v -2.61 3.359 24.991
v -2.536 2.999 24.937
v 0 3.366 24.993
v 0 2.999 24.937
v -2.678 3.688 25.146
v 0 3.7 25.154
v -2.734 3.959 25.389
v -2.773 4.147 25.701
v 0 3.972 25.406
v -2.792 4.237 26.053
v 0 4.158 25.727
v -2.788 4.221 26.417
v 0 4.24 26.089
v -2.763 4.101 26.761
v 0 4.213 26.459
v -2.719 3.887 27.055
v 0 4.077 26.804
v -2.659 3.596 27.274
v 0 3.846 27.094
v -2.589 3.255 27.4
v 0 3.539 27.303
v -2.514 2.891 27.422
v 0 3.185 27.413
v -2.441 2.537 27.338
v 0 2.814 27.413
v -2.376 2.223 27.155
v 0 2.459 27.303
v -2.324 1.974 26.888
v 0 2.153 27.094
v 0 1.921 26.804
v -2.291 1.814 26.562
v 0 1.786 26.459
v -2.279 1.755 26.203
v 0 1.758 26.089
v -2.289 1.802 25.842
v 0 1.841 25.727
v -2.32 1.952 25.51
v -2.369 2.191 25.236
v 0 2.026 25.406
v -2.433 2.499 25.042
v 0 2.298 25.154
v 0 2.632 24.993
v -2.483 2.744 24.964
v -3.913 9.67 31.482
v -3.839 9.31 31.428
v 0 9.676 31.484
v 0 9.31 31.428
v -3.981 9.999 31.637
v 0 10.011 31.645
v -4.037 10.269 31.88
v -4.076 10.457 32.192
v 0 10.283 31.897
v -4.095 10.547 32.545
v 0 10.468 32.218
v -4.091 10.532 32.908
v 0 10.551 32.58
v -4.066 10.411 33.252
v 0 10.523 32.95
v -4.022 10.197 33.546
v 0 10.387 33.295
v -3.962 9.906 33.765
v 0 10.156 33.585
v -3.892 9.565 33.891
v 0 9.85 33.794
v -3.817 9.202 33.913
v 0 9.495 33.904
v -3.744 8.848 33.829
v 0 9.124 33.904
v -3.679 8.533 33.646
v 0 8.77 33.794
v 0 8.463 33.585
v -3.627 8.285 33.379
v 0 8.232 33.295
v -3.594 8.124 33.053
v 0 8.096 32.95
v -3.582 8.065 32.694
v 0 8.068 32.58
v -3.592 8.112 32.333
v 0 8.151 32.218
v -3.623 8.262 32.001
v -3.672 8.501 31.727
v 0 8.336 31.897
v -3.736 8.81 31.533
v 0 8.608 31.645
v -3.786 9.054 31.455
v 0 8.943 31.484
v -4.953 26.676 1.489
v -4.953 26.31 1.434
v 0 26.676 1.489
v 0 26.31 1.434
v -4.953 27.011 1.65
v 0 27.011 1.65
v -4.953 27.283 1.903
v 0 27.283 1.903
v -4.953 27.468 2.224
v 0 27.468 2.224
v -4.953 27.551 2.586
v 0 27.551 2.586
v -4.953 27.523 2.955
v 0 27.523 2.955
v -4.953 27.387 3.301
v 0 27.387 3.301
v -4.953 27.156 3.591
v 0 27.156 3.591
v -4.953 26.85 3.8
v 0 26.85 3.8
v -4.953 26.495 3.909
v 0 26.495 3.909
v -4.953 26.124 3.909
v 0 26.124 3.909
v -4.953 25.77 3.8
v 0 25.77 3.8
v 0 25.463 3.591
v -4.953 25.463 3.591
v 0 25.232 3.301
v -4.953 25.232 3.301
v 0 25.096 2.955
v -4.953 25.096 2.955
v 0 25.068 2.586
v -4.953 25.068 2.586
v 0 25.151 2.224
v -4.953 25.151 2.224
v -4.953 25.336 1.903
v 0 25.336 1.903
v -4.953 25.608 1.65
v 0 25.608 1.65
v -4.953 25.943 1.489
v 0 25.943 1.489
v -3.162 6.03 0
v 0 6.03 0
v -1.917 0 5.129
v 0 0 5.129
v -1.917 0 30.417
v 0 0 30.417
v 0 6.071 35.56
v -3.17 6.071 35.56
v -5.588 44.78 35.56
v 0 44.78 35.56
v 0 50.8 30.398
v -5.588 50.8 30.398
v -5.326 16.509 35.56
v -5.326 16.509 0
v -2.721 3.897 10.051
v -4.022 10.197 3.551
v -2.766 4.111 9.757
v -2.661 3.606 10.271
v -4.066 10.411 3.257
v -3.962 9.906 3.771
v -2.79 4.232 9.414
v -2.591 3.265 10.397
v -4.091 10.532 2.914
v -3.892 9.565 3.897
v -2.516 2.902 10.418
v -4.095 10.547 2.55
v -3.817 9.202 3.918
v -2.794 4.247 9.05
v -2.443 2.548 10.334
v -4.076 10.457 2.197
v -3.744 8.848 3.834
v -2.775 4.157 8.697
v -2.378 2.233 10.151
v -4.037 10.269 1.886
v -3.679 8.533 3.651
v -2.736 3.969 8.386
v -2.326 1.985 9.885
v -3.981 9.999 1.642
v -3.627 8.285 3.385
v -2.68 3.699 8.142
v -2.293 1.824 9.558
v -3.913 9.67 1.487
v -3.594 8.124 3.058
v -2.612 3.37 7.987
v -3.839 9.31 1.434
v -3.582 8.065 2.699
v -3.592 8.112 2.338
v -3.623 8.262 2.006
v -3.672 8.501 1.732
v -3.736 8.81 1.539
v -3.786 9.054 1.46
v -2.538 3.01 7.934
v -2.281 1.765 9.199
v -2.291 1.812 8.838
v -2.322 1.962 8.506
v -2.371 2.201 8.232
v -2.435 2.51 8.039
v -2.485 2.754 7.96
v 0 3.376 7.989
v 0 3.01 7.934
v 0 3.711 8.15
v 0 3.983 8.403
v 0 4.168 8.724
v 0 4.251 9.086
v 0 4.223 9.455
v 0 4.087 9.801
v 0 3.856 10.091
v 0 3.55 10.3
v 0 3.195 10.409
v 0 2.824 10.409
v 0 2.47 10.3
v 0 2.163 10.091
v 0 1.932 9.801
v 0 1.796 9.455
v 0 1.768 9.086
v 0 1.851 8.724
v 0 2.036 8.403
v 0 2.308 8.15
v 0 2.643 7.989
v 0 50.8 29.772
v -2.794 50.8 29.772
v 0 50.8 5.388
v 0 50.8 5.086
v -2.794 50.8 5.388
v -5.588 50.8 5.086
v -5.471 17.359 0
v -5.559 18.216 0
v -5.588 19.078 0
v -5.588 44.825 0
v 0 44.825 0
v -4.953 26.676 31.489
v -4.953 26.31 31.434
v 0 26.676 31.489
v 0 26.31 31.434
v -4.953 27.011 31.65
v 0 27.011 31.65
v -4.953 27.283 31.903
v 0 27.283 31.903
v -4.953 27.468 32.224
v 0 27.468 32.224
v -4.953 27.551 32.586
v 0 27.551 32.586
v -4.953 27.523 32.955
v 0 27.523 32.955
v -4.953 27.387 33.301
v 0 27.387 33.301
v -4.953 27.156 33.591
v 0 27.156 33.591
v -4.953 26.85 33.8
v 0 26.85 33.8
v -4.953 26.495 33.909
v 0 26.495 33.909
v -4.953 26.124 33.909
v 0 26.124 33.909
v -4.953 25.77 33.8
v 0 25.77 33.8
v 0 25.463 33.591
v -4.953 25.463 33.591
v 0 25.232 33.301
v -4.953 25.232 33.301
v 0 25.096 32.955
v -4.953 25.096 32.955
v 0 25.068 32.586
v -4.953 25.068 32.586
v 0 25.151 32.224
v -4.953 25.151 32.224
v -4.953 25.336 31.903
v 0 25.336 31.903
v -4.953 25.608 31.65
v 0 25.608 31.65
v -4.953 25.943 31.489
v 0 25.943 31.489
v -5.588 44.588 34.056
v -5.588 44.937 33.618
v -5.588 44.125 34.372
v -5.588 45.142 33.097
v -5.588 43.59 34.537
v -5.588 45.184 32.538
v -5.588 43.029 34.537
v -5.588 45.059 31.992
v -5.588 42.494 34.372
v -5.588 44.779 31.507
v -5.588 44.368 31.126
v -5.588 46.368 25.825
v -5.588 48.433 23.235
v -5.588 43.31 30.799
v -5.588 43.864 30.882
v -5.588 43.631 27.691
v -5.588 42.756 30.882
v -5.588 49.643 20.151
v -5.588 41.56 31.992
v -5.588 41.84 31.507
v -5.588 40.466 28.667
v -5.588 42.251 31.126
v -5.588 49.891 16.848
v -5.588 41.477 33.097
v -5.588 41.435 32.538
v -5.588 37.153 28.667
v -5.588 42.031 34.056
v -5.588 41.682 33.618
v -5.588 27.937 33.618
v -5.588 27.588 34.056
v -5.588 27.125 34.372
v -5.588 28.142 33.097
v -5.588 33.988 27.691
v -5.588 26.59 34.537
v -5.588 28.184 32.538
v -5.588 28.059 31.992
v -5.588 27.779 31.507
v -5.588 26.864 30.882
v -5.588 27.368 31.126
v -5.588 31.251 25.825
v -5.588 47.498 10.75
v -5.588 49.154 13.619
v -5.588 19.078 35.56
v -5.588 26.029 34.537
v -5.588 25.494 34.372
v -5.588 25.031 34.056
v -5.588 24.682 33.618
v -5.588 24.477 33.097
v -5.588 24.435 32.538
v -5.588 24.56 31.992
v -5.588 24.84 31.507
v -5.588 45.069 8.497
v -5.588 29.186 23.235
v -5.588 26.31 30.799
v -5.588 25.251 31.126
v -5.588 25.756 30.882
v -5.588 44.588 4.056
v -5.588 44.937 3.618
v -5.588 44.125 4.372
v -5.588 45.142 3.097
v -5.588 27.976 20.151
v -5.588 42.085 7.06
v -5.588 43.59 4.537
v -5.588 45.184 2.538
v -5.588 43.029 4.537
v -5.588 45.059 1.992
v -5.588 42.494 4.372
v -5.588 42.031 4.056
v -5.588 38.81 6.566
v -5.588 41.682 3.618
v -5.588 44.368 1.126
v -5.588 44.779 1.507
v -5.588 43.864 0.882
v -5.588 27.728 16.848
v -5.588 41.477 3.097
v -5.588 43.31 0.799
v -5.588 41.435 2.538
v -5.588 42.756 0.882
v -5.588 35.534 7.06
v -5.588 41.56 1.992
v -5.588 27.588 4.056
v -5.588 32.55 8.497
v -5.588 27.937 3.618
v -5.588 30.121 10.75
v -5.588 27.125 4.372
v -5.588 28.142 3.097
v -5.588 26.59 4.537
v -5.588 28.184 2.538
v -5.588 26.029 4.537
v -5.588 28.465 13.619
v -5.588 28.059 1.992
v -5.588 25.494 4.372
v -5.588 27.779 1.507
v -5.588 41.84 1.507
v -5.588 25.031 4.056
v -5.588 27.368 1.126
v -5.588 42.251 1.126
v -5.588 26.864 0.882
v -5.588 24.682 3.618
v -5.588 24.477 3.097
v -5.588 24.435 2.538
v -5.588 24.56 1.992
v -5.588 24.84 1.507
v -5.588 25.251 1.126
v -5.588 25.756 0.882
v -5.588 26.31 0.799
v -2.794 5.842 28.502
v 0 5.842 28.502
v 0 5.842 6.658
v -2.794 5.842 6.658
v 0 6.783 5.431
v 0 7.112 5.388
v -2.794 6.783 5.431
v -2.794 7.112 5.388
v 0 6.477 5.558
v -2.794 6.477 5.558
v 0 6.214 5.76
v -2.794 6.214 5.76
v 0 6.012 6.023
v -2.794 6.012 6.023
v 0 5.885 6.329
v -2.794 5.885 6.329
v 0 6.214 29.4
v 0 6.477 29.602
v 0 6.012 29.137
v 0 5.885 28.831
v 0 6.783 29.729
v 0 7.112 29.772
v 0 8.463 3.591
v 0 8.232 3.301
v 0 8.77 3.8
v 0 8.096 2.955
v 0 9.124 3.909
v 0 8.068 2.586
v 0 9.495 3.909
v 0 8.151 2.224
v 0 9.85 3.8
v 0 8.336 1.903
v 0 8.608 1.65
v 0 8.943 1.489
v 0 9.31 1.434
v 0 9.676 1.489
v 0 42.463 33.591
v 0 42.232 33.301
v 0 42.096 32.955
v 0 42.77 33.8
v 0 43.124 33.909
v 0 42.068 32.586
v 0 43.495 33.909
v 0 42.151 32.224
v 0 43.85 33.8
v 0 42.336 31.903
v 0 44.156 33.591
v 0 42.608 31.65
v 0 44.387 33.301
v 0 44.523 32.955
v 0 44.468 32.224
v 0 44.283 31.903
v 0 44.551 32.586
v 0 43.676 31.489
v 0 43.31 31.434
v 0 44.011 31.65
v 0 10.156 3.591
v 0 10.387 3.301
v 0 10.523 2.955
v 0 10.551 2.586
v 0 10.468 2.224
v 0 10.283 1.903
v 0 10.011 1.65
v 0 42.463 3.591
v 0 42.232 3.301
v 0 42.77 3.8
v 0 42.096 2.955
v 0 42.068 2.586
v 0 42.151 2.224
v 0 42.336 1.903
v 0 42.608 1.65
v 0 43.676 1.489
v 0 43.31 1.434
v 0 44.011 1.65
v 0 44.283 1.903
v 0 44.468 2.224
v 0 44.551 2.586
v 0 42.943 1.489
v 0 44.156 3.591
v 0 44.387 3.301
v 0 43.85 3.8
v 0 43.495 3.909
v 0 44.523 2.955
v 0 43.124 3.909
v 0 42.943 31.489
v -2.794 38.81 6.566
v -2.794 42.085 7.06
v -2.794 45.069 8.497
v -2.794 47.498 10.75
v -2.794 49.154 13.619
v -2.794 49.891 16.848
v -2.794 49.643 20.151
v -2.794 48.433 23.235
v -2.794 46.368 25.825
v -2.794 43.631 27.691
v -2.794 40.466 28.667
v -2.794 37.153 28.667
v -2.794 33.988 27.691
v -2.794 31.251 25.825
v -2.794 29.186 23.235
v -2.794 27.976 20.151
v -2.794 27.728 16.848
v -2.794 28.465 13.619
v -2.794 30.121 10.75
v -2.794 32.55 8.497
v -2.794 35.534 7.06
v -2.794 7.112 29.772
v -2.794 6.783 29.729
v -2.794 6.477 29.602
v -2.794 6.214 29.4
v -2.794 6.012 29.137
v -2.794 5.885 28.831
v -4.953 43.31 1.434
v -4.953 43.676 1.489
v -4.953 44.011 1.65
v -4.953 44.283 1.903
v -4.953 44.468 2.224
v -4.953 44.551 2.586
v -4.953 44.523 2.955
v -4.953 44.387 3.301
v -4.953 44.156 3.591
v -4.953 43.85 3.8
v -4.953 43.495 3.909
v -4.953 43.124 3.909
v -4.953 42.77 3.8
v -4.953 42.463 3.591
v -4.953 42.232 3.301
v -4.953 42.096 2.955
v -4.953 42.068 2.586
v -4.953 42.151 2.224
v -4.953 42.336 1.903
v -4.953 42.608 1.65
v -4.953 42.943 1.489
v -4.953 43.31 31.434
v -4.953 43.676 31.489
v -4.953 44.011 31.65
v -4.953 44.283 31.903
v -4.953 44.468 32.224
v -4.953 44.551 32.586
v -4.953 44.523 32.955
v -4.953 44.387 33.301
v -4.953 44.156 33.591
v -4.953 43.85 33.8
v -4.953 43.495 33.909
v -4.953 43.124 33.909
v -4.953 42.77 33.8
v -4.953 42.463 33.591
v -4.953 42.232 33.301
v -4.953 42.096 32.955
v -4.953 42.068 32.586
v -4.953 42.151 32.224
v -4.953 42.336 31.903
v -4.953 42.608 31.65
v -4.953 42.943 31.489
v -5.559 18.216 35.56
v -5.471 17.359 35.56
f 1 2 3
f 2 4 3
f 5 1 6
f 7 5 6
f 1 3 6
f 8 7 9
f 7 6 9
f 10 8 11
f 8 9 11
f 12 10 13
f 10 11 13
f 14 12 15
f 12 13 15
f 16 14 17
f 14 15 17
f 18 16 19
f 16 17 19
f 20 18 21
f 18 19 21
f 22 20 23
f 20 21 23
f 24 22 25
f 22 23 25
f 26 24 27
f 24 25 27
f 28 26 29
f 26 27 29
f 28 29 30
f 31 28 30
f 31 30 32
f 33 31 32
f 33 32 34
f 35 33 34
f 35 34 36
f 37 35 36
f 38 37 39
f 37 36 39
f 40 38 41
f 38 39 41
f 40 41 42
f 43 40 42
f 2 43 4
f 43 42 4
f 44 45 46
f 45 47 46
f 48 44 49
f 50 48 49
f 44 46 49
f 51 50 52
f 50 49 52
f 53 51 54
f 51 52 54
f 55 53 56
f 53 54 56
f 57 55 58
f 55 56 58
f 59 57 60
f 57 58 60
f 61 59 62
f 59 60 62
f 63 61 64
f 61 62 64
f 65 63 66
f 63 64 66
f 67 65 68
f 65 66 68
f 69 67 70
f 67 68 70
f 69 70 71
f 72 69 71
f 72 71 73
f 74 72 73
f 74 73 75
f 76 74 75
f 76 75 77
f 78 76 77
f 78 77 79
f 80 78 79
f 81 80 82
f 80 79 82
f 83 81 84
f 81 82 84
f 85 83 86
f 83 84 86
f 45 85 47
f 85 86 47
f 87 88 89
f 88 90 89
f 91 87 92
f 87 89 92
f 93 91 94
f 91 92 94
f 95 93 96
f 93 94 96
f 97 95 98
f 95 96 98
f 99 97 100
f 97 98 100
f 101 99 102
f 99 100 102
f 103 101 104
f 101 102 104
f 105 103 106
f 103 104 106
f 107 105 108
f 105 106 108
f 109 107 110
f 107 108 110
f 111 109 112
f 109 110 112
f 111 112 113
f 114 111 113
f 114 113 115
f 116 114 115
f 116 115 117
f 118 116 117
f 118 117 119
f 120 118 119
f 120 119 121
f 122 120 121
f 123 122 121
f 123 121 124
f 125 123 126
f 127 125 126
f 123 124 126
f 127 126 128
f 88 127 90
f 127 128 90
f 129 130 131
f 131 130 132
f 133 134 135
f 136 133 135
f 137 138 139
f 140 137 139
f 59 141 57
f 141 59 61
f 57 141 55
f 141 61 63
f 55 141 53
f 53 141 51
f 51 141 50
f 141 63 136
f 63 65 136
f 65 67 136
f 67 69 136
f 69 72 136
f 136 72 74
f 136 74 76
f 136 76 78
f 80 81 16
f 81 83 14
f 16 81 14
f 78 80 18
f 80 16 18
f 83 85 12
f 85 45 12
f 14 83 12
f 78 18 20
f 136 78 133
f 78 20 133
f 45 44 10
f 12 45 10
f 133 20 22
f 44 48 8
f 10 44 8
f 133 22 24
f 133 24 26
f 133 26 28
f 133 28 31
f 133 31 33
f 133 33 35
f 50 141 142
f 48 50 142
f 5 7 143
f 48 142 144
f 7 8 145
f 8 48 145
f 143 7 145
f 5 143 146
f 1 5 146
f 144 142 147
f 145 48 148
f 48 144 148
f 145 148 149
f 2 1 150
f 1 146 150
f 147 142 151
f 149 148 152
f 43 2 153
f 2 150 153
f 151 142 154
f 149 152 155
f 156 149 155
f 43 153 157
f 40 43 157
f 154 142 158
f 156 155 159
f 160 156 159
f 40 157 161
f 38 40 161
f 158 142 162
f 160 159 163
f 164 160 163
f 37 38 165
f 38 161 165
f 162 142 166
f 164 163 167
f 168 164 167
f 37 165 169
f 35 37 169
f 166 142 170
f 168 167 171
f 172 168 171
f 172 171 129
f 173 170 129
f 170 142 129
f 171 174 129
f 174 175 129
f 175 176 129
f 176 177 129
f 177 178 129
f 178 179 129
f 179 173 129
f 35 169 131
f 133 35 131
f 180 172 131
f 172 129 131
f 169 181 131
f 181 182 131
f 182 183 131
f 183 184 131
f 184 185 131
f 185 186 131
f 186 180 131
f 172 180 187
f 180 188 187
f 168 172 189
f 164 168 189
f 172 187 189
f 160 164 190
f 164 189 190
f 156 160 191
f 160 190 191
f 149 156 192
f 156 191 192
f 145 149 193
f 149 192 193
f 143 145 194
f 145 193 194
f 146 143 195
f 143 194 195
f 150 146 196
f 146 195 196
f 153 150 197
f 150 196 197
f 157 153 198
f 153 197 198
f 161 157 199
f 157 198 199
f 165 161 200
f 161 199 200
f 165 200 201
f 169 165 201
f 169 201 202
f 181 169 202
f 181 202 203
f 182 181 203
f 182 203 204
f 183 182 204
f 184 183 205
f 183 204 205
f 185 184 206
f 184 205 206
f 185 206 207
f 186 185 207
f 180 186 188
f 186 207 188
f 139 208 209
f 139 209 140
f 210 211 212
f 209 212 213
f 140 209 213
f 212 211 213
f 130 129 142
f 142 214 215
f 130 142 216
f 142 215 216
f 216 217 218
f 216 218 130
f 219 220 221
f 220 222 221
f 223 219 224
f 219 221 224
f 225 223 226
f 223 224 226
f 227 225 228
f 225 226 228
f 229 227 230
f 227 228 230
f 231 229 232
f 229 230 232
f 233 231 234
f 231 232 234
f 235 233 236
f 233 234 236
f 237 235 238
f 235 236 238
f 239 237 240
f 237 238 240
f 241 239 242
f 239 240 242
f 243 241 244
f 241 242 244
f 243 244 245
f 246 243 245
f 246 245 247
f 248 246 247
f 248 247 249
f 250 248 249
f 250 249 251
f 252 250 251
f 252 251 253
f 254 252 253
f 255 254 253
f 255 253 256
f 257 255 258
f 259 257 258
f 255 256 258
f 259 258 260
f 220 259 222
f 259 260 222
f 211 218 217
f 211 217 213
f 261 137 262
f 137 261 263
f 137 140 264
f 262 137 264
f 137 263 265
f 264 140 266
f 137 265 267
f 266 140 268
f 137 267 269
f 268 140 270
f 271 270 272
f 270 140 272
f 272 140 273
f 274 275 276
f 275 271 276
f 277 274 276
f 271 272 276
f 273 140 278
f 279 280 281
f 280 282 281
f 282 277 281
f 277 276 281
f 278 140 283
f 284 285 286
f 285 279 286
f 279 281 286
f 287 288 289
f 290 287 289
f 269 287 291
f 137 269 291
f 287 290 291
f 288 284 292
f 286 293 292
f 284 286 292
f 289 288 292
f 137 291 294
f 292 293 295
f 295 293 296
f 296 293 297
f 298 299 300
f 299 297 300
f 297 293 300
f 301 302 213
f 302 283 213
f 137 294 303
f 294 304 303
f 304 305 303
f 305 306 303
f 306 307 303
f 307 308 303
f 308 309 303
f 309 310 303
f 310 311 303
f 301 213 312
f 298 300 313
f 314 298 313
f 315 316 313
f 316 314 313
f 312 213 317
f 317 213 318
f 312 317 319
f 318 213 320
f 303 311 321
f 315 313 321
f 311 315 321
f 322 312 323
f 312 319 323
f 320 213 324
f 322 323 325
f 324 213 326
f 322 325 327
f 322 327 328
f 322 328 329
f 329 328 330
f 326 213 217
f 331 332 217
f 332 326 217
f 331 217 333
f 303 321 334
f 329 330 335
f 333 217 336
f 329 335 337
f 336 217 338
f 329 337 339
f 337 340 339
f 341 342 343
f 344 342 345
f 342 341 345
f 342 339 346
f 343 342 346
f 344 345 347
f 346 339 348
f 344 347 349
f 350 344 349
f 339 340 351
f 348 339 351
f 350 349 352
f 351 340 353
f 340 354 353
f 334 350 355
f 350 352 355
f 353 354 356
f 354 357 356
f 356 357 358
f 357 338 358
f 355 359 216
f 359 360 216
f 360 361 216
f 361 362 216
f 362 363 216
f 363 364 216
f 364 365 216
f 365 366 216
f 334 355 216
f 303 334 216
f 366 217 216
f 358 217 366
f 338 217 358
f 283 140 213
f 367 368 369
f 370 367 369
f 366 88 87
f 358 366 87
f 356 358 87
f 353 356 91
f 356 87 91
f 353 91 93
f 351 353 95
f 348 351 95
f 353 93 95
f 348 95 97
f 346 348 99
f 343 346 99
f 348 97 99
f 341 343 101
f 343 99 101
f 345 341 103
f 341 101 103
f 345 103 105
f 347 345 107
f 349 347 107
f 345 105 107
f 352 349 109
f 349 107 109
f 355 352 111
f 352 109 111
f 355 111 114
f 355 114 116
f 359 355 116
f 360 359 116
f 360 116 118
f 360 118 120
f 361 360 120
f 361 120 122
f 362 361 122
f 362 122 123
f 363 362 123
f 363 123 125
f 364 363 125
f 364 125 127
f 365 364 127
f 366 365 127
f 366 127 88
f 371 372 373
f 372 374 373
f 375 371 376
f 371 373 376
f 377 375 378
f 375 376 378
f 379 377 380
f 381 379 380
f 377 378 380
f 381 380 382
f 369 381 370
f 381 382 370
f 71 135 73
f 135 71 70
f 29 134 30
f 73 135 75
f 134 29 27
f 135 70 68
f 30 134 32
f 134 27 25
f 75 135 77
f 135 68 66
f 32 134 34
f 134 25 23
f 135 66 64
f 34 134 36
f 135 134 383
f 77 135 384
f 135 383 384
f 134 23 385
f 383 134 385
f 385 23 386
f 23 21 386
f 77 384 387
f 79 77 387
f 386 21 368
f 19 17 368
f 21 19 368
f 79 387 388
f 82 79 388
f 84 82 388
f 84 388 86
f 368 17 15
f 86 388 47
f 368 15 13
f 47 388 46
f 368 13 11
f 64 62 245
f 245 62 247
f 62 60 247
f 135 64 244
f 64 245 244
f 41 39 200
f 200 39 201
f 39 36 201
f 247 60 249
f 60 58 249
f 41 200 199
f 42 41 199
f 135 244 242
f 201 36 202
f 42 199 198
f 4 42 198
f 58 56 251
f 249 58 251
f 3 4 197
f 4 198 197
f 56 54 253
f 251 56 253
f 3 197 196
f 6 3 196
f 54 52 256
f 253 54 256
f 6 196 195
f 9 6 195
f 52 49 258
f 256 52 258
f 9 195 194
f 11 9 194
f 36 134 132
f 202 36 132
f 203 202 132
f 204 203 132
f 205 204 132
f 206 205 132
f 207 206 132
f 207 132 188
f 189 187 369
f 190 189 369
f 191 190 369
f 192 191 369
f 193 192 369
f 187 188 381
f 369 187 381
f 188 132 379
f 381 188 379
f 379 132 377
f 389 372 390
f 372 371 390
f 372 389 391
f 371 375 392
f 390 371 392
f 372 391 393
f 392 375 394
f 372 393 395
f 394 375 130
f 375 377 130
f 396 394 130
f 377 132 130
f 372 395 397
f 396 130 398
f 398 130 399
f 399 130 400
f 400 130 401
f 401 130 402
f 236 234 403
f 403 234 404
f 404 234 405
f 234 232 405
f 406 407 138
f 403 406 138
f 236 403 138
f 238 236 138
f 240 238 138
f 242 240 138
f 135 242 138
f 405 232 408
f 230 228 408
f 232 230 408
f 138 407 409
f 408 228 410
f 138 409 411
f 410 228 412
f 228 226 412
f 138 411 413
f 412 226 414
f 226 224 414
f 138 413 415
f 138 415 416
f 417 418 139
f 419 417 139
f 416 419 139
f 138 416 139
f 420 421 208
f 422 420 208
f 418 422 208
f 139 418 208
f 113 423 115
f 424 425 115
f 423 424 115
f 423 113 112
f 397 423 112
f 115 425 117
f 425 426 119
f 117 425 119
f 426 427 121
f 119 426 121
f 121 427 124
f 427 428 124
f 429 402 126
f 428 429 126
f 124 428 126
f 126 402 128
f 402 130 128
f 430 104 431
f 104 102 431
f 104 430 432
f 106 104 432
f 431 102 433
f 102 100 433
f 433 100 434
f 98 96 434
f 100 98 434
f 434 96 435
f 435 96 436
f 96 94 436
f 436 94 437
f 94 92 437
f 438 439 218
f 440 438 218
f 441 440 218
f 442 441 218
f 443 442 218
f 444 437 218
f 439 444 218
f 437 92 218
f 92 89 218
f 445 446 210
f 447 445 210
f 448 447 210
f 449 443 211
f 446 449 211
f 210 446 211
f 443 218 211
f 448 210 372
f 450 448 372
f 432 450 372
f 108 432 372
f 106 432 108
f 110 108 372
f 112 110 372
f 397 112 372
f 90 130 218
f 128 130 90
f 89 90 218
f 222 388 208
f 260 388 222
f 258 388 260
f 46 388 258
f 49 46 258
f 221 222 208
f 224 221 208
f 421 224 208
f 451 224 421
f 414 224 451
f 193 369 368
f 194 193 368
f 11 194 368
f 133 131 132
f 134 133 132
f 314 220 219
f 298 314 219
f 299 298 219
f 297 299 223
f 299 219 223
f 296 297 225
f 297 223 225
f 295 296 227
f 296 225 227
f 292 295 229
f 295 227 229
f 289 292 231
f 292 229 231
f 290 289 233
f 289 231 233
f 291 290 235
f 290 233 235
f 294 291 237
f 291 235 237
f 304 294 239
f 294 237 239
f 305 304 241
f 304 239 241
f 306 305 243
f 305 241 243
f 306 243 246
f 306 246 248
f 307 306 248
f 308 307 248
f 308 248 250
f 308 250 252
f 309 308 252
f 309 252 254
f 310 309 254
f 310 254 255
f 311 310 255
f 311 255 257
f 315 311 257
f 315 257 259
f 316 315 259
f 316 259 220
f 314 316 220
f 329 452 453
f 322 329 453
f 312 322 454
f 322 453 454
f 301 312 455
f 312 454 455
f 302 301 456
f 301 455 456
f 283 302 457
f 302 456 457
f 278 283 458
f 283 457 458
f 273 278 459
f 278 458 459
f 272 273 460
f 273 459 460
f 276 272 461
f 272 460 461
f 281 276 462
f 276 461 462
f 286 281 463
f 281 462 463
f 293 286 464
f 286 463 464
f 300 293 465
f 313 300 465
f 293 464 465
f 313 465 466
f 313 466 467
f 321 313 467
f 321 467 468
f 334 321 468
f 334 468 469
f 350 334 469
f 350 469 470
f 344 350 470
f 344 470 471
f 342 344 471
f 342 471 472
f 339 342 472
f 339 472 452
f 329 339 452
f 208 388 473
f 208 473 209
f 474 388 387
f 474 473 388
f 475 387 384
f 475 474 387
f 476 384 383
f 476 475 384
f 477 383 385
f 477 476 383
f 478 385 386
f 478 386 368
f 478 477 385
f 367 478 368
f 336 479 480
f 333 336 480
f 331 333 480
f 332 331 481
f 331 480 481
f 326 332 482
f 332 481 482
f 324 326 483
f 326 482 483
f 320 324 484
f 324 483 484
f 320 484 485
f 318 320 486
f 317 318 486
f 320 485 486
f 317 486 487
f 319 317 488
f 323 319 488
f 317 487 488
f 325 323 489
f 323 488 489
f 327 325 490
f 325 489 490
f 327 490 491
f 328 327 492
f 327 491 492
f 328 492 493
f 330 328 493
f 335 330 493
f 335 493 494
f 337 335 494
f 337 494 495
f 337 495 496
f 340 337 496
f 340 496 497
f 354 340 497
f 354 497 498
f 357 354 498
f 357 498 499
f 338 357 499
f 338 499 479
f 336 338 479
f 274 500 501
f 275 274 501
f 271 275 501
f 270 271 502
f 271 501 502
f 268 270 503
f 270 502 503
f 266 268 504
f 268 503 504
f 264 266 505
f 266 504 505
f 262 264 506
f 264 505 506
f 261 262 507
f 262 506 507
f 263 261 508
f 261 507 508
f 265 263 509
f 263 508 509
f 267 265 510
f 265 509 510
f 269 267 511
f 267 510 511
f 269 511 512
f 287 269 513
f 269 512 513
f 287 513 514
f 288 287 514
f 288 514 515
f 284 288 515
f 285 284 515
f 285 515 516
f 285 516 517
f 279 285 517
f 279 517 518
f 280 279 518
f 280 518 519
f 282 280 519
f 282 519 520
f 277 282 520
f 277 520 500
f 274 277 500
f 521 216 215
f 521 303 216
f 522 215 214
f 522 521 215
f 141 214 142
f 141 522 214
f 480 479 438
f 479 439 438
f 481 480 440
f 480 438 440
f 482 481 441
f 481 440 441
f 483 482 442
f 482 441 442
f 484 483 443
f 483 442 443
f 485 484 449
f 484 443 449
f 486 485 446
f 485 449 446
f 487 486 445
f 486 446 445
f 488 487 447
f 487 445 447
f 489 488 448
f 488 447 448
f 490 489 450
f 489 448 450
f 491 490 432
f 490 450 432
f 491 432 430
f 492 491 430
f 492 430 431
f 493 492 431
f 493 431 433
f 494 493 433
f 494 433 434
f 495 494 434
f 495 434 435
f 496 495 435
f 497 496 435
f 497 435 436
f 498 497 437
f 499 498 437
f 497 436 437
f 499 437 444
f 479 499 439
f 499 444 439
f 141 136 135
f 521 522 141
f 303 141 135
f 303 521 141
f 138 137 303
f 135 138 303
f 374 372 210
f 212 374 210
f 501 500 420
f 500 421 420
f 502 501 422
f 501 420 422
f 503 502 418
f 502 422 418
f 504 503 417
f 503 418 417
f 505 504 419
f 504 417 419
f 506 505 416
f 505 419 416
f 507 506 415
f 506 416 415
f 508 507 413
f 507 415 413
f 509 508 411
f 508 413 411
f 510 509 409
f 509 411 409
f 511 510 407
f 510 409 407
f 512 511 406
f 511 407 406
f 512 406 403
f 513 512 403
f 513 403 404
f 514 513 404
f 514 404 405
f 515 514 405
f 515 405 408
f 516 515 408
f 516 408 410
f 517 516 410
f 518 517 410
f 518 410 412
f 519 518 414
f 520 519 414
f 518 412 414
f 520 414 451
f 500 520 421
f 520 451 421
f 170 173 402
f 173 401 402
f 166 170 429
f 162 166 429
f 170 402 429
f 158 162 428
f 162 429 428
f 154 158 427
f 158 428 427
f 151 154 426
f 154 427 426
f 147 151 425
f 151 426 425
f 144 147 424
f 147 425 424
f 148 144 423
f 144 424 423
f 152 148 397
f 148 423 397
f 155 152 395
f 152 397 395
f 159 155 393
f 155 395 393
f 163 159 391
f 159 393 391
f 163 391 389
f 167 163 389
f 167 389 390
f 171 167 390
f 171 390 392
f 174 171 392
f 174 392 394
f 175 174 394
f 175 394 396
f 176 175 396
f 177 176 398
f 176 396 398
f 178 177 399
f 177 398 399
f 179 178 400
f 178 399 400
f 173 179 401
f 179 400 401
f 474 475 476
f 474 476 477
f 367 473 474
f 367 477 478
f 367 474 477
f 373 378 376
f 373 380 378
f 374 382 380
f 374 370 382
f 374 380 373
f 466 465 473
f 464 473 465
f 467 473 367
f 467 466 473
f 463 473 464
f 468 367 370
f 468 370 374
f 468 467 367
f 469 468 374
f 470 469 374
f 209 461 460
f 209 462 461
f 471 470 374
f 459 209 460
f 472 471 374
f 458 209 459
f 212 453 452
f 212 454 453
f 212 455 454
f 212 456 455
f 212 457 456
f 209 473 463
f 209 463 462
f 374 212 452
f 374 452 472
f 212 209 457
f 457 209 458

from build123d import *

# Parameters (mm, degrees)
BOSS_EXTRUDE1_DEPTH                   = 35.56
FILLET1_R                             = 12.7
SKETCH6_W                             = 24.384
SKETCH6_H                             = 44.958
CUT_EXTRUDE1_DEPTH                    = 2.794
FILLET2_R                             = 1.27
CUT_EXTRUDE3_DEPTH                    = 63.260576162
CUT_EXTRUDE4_DEPTH                    = 63.260576162
F_7_8_0_875_DIAMETER_HOLE1_D          = 22.225
F_40_0_098_DIAMETER_HOLE1_D           = 2.4892
F_40_0_098_DIAMETER_HOLE1_CSINK_D     = 3.7592
F_40_0_098_DIAMETER_HOLE1_CSINK_ANGLE = 90


with BuildPart() as part:
    # Sketch1 → Boss-Extrude1 (new body)
    with BuildSketch(Plane.XY):
        Polygon((0, 0), (0, 50.8), (-5.588, 50.8), (-5.588, 17.78), (-1.916643762, 0), align=None)
    extrude(amount=BOSS_EXTRUDE1_DEPTH)

    # Fillet1
    fillet1_edges = [part.edges().sort_by_distance(p)[0] for p in [
        (-5.588, 17.78, 17.78),
    ]]
    fillet(fillet1_edges, radius=FILLET1_R)

    # Sketch6 → Cut-Extrude1 (cut)
    with BuildSketch(Plane(origin=(0, 0, 0), x_dir=(0, 0, -1), z_dir=(1, 0, 0))):
        with Locations((-17.580042727, 28.321)):
            Rectangle(SKETCH6_W, SKETCH6_H)
    extrude(amount=-CUT_EXTRUDE1_DEPTH, mode=Mode.SUBTRACT)

    # Fillet2
    fillet2_edges = [part.edges().sort_by_distance(p)[0] for p in [
        (-1.397, 5.842, 29.772042727),
        (-1.397, 5.842, 5.388042727),
    ]]
    fillet(fillet2_edges, radius=FILLET2_R)

    # Sketch10 → Cut-Extrude3 (cut, through all)
    with BuildSketch(Plane(origin=(0, 0, 0), x_dir=(0, 0, -1), z_dir=(1, 0, 0))):
        Polygon((-35.56, 44.780420684), (-30.397580851, 50.8), (-35.56, 50.8), align=None)
    extrude(amount=-CUT_EXTRUDE3_DEPTH, mode=Mode.SUBTRACT)

    # Sketch11 → Cut-Extrude4 (cut, through all)
    with BuildSketch(Plane(origin=(0, 0, 0), x_dir=(0, 0, -1), z_dir=(1, 0, 0))):
        Polygon((-5.085545117, 50.8), (0, 50.8), (0, 44.824895363), align=None)
        Polygon((0, 6.029531172), (-5.128692816, 0), (0, 0), align=None)
        Polygon((-35.56, 6.07121688), (-35.56, 0), (-30.417091858, 0), align=None)
    extrude(amount=-CUT_EXTRUDE4_DEPTH, mode=Mode.SUBTRACT)

    # 7/8 (0.875) Diameter Hole1 (through all)
    with Locations(Plane.ZY.offset(5.588)):
        with Locations((17.678535919, 38.809523369)):
            Hole(F_7_8_0_875_DIAMETER_HOLE1_D / 2)

    # #40 (0.098) Diameter Hole1 (through all)
    with Locations(Plane.ZY.offset(5.588)):
        with Locations((2.678535919, 43.309523369), (2.678535919, 26.309523369), (2.678535919, 9.309523369), (9.178535919, 3.009523369), (26.181895158, 2.999179942), (32.672944692, 9.309523369), (32.678535919, 26.309523369), (32.678535919, 43.309523369)):
            CounterSinkHole(F_40_0_098_DIAMETER_HOLE1_D / 2, F_40_0_098_DIAMETER_HOLE1_CSINK_D / 2, counter_sink_angle=F_40_0_098_DIAMETER_HOLE1_CSINK_ANGLE)


solid = part.part
